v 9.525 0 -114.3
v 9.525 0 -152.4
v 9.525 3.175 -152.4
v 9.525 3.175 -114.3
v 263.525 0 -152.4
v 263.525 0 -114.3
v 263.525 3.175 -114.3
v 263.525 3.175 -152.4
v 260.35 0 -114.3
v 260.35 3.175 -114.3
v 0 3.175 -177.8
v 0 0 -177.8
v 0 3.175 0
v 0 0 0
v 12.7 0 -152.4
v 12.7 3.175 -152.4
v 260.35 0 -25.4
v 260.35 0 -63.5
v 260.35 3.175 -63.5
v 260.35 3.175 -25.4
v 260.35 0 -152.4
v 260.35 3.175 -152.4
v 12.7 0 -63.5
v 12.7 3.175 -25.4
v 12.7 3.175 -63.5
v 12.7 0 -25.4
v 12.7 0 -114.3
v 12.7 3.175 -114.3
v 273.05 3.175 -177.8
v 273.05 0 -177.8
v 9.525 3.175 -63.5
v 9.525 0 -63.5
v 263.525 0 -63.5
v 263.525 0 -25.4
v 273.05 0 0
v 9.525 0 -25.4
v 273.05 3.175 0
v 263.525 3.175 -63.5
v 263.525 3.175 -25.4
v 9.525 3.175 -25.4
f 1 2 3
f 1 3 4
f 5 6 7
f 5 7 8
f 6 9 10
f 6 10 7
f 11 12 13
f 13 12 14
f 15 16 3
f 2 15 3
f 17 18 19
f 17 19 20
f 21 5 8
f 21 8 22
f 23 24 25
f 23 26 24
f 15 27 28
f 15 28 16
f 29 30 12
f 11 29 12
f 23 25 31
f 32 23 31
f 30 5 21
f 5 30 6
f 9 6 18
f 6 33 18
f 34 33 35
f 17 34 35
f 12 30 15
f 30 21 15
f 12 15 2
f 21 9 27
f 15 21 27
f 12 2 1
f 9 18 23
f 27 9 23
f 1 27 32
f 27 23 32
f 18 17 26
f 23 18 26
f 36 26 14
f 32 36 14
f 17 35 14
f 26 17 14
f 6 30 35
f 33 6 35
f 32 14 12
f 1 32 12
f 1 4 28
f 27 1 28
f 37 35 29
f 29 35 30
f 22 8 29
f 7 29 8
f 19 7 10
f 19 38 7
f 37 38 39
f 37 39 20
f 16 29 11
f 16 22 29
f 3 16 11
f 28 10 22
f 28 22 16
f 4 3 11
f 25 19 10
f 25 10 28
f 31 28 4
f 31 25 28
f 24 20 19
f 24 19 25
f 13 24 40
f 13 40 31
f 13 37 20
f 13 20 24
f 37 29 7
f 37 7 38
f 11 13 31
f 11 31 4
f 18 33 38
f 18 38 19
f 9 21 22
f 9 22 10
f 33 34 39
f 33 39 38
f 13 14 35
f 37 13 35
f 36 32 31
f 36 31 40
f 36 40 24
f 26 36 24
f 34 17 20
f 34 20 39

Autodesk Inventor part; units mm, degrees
ref_plane "YZ Plane" through (0, 0, 0) normal (1, 0, 0) x (0, 1, 0)
ref_plane "XZ Plane" through (0, 0, 0) normal (0, 1, 0) x (-1, 0, 0)
ref_plane "XY Plane" through (0, 0, 0) normal (0, 0, 1) x (1, 0, 0)
sketch "Sketch1" plane through (0, 0, 0) normal (0, 1, 0) x (-1, 0, 0)
  line L0 (0, 0) -> (-273.05, 0)
  line L1 (-273.05, 0) -> (-273.05, -177.8)
  line L2 (-273.05, -177.8) -> (0, -177.8)
  line L3 (0, -177.8) -> (0, 0)
  line L4 (-260.35, -25.4) -> (-263.525, -25.4)
  line L5 (-263.525, -25.4) -> (-263.525, -63.5)
  line L6 (-263.525, -63.5) -> (-260.35, -63.5)
  line L7 (-260.35, -63.5) -> (-260.35, -25.4)
  line L8 (-260.35, -114.3) -> (-263.525, -114.3)
  line L9 (-263.525, -114.3) -> (-263.525, -152.4)
  line L10 (-263.525, -152.4) -> (-260.35, -152.4)
  line L11 (-260.35, -152.4) -> (-260.35, -114.3)
  line L12 (-9.525, -25.4) -> (-12.7, -25.4)
  line L13 (-12.7, -25.4) -> (-12.7, -63.5)
  line L14 (-12.7, -63.5) -> (-9.525, -63.5)
  line L15 (-9.525, -63.5) -> (-9.525, -25.4)
  line L16 (-9.525, -114.3) -> (-12.7, -114.3)
  line L17 (-12.7, -114.3) -> (-12.7, -152.4)
  line L18 (-12.7, -152.4) -> (-9.525, -152.4)
  line L19 (-9.525, -152.4) -> (-9.525, -114.3)
  dimension "d0" = 273.05
  dimension "d1" = 177.8
  dimension "d2" = 3.175
  dimension "d3" = 3.175
  dimension "d4" = 3.175
  dimension "d5" = 3.175
  dimension "d6" = 9.525
  dimension "d7" = 9.525
  dimension "d8" = 38.1
  dimension "d9" = 38.1
  dimension "d10" = 38.1
  dimension "d11" = 38.1
  dimension "d12" = 9.525
  dimension "d13" = 9.525
  dimension "d14" = 25.4
  dimension "d15" = 25.4
  dimension "d16" = 25.4
  dimension "d17" = 25.4
extrude "Extrusion1" add sketch "Sketch1" along normal blind 3.175
properties part number "C4Base"
